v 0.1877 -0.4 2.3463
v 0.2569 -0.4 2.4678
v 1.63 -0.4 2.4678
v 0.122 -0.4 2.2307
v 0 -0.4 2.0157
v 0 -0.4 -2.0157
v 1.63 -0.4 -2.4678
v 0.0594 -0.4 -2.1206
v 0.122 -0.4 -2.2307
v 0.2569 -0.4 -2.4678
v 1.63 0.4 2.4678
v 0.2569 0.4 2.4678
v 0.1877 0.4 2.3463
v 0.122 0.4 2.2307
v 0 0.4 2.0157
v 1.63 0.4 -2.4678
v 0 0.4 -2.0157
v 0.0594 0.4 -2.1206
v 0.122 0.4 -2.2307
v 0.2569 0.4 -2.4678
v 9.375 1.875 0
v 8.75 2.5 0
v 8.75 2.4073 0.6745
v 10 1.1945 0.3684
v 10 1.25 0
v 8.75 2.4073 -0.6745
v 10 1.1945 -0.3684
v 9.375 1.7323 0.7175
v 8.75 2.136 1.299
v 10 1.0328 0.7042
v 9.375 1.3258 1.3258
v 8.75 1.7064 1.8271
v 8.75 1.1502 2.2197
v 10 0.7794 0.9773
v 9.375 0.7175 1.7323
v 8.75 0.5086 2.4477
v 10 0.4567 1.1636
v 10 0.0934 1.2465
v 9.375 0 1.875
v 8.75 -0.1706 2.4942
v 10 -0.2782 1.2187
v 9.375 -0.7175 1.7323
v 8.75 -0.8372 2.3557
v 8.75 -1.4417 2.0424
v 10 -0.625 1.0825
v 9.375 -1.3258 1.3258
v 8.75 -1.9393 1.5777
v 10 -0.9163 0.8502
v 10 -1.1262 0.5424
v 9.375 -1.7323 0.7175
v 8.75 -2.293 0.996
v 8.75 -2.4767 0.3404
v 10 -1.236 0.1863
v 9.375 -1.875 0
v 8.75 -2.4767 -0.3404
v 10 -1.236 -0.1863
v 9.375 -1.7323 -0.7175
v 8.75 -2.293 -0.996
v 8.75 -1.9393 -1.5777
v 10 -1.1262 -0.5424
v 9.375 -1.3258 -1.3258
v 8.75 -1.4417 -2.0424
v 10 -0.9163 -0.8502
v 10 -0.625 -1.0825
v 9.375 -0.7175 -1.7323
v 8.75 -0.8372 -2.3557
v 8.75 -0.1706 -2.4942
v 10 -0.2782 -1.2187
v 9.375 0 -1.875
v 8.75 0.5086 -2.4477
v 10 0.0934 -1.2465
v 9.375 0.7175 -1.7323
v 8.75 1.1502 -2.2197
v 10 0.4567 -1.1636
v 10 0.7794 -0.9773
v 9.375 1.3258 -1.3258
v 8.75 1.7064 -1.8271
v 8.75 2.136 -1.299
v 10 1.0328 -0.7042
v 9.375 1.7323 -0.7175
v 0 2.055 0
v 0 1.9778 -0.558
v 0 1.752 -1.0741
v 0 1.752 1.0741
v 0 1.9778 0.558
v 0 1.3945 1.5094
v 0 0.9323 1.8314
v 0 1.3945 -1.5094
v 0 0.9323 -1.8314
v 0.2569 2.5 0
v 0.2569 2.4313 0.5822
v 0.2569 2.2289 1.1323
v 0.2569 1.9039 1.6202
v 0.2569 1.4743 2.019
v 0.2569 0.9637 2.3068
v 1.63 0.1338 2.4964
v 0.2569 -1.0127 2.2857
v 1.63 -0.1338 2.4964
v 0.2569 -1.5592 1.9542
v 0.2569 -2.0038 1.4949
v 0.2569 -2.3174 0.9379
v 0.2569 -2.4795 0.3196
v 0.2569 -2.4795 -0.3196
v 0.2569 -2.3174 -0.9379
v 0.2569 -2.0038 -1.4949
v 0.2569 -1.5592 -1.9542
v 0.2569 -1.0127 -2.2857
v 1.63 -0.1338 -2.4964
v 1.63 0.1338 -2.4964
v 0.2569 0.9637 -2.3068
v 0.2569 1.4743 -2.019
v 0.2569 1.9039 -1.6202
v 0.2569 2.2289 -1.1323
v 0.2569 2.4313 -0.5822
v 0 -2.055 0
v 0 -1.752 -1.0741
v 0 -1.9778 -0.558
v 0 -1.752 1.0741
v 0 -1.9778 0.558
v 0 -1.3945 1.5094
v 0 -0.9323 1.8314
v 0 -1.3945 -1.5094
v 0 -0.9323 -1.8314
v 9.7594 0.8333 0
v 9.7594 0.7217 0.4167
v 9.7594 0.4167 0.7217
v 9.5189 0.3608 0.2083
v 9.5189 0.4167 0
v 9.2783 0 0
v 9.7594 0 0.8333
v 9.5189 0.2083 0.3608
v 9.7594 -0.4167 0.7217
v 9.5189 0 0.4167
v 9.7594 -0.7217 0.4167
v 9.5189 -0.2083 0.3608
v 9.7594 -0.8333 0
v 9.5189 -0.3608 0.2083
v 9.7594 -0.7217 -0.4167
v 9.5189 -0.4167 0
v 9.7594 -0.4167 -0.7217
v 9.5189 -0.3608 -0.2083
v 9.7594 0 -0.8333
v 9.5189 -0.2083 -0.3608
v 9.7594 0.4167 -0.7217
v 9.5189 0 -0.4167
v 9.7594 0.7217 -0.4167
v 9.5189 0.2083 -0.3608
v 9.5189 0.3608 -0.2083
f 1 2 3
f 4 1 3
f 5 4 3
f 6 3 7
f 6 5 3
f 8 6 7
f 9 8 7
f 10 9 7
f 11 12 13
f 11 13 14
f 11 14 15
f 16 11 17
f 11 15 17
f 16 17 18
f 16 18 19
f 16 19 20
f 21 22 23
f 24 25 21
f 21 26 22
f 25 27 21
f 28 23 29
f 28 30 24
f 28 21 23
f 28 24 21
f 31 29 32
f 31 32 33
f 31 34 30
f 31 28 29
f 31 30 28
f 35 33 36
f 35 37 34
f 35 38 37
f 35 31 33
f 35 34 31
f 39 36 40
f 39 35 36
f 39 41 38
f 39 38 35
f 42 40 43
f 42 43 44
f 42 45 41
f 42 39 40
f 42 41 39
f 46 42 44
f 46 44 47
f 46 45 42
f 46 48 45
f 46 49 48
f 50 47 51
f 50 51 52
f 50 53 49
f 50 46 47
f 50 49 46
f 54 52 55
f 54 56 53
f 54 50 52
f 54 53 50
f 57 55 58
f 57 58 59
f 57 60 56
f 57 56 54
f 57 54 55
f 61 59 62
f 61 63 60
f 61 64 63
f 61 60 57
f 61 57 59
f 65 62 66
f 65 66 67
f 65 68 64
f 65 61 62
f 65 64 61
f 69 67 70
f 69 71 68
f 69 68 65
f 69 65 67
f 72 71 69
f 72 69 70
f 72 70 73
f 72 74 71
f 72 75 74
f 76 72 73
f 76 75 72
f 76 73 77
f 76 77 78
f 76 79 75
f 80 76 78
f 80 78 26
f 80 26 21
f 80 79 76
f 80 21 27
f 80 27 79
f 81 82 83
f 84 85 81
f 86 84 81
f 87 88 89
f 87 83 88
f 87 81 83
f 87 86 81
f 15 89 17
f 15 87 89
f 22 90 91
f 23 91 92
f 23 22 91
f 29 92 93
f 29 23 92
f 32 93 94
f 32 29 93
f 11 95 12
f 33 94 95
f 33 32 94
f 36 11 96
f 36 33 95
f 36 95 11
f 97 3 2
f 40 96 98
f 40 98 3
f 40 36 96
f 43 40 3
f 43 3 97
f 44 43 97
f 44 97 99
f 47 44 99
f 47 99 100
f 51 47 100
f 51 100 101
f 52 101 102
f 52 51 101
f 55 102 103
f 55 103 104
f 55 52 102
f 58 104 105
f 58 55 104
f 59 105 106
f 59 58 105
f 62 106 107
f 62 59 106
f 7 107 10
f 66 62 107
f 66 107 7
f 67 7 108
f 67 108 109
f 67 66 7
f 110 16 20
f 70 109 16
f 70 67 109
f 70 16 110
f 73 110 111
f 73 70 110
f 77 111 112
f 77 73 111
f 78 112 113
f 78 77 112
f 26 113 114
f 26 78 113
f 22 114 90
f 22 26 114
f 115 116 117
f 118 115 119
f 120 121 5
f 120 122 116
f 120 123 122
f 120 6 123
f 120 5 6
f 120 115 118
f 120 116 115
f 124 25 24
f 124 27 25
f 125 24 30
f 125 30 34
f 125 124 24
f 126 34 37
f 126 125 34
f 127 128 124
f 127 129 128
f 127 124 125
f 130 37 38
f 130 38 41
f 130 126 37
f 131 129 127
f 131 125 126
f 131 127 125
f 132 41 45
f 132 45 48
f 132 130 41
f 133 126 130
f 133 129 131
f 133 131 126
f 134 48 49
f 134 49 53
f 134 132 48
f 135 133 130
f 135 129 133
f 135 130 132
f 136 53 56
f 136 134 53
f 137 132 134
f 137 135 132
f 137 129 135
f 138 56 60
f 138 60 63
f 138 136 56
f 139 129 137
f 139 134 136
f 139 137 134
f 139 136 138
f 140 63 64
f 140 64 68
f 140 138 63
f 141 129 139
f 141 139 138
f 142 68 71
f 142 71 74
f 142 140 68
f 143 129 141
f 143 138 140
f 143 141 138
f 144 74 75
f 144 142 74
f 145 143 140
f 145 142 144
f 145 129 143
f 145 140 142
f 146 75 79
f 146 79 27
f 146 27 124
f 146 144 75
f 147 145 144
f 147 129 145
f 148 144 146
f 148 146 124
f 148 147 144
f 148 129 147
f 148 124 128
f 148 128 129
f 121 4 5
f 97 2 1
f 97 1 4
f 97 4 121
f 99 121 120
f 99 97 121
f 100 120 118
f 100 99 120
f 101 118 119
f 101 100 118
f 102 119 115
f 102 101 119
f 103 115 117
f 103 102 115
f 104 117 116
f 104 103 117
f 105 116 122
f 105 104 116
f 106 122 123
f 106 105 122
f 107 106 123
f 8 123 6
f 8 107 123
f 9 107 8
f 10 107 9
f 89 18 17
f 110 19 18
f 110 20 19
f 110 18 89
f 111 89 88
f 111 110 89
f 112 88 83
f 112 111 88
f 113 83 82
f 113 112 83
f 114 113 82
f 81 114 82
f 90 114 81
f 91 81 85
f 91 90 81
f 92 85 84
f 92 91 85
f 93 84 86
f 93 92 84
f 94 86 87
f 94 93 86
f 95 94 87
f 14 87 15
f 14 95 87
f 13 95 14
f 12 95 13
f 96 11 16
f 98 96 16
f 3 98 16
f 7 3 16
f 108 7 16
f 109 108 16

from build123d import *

# Parameters (mm, degrees)
SKETCH2_W  = 5
SKETCH2_H  = 0.8
SLOT_DEPTH = 1.63


with BuildPart() as part:
    # BodySke → BaseBody (revolve)
    with BuildSketch(Plane.XY):
        Polygon((10, 1.25), (9.278312164, 0), (0, 0), (0, 2.055), (0.25692087, 2.5), (8.75, 2.5), align=None)
    revolve(axis=Axis((-12.7, 0, 0), (1, 0, 0)))

    # Sketch2 → Slot (cut)
    with BuildSketch(Plane(origin=(0, 0, 0), x_dir=(0, 0, -1), z_dir=(1, 0, 0))):
        Rectangle(SKETCH2_W, SKETCH2_H)
    extrude(amount=SLOT_DEPTH, mode=Mode.SUBTRACT)


solid = part.part
